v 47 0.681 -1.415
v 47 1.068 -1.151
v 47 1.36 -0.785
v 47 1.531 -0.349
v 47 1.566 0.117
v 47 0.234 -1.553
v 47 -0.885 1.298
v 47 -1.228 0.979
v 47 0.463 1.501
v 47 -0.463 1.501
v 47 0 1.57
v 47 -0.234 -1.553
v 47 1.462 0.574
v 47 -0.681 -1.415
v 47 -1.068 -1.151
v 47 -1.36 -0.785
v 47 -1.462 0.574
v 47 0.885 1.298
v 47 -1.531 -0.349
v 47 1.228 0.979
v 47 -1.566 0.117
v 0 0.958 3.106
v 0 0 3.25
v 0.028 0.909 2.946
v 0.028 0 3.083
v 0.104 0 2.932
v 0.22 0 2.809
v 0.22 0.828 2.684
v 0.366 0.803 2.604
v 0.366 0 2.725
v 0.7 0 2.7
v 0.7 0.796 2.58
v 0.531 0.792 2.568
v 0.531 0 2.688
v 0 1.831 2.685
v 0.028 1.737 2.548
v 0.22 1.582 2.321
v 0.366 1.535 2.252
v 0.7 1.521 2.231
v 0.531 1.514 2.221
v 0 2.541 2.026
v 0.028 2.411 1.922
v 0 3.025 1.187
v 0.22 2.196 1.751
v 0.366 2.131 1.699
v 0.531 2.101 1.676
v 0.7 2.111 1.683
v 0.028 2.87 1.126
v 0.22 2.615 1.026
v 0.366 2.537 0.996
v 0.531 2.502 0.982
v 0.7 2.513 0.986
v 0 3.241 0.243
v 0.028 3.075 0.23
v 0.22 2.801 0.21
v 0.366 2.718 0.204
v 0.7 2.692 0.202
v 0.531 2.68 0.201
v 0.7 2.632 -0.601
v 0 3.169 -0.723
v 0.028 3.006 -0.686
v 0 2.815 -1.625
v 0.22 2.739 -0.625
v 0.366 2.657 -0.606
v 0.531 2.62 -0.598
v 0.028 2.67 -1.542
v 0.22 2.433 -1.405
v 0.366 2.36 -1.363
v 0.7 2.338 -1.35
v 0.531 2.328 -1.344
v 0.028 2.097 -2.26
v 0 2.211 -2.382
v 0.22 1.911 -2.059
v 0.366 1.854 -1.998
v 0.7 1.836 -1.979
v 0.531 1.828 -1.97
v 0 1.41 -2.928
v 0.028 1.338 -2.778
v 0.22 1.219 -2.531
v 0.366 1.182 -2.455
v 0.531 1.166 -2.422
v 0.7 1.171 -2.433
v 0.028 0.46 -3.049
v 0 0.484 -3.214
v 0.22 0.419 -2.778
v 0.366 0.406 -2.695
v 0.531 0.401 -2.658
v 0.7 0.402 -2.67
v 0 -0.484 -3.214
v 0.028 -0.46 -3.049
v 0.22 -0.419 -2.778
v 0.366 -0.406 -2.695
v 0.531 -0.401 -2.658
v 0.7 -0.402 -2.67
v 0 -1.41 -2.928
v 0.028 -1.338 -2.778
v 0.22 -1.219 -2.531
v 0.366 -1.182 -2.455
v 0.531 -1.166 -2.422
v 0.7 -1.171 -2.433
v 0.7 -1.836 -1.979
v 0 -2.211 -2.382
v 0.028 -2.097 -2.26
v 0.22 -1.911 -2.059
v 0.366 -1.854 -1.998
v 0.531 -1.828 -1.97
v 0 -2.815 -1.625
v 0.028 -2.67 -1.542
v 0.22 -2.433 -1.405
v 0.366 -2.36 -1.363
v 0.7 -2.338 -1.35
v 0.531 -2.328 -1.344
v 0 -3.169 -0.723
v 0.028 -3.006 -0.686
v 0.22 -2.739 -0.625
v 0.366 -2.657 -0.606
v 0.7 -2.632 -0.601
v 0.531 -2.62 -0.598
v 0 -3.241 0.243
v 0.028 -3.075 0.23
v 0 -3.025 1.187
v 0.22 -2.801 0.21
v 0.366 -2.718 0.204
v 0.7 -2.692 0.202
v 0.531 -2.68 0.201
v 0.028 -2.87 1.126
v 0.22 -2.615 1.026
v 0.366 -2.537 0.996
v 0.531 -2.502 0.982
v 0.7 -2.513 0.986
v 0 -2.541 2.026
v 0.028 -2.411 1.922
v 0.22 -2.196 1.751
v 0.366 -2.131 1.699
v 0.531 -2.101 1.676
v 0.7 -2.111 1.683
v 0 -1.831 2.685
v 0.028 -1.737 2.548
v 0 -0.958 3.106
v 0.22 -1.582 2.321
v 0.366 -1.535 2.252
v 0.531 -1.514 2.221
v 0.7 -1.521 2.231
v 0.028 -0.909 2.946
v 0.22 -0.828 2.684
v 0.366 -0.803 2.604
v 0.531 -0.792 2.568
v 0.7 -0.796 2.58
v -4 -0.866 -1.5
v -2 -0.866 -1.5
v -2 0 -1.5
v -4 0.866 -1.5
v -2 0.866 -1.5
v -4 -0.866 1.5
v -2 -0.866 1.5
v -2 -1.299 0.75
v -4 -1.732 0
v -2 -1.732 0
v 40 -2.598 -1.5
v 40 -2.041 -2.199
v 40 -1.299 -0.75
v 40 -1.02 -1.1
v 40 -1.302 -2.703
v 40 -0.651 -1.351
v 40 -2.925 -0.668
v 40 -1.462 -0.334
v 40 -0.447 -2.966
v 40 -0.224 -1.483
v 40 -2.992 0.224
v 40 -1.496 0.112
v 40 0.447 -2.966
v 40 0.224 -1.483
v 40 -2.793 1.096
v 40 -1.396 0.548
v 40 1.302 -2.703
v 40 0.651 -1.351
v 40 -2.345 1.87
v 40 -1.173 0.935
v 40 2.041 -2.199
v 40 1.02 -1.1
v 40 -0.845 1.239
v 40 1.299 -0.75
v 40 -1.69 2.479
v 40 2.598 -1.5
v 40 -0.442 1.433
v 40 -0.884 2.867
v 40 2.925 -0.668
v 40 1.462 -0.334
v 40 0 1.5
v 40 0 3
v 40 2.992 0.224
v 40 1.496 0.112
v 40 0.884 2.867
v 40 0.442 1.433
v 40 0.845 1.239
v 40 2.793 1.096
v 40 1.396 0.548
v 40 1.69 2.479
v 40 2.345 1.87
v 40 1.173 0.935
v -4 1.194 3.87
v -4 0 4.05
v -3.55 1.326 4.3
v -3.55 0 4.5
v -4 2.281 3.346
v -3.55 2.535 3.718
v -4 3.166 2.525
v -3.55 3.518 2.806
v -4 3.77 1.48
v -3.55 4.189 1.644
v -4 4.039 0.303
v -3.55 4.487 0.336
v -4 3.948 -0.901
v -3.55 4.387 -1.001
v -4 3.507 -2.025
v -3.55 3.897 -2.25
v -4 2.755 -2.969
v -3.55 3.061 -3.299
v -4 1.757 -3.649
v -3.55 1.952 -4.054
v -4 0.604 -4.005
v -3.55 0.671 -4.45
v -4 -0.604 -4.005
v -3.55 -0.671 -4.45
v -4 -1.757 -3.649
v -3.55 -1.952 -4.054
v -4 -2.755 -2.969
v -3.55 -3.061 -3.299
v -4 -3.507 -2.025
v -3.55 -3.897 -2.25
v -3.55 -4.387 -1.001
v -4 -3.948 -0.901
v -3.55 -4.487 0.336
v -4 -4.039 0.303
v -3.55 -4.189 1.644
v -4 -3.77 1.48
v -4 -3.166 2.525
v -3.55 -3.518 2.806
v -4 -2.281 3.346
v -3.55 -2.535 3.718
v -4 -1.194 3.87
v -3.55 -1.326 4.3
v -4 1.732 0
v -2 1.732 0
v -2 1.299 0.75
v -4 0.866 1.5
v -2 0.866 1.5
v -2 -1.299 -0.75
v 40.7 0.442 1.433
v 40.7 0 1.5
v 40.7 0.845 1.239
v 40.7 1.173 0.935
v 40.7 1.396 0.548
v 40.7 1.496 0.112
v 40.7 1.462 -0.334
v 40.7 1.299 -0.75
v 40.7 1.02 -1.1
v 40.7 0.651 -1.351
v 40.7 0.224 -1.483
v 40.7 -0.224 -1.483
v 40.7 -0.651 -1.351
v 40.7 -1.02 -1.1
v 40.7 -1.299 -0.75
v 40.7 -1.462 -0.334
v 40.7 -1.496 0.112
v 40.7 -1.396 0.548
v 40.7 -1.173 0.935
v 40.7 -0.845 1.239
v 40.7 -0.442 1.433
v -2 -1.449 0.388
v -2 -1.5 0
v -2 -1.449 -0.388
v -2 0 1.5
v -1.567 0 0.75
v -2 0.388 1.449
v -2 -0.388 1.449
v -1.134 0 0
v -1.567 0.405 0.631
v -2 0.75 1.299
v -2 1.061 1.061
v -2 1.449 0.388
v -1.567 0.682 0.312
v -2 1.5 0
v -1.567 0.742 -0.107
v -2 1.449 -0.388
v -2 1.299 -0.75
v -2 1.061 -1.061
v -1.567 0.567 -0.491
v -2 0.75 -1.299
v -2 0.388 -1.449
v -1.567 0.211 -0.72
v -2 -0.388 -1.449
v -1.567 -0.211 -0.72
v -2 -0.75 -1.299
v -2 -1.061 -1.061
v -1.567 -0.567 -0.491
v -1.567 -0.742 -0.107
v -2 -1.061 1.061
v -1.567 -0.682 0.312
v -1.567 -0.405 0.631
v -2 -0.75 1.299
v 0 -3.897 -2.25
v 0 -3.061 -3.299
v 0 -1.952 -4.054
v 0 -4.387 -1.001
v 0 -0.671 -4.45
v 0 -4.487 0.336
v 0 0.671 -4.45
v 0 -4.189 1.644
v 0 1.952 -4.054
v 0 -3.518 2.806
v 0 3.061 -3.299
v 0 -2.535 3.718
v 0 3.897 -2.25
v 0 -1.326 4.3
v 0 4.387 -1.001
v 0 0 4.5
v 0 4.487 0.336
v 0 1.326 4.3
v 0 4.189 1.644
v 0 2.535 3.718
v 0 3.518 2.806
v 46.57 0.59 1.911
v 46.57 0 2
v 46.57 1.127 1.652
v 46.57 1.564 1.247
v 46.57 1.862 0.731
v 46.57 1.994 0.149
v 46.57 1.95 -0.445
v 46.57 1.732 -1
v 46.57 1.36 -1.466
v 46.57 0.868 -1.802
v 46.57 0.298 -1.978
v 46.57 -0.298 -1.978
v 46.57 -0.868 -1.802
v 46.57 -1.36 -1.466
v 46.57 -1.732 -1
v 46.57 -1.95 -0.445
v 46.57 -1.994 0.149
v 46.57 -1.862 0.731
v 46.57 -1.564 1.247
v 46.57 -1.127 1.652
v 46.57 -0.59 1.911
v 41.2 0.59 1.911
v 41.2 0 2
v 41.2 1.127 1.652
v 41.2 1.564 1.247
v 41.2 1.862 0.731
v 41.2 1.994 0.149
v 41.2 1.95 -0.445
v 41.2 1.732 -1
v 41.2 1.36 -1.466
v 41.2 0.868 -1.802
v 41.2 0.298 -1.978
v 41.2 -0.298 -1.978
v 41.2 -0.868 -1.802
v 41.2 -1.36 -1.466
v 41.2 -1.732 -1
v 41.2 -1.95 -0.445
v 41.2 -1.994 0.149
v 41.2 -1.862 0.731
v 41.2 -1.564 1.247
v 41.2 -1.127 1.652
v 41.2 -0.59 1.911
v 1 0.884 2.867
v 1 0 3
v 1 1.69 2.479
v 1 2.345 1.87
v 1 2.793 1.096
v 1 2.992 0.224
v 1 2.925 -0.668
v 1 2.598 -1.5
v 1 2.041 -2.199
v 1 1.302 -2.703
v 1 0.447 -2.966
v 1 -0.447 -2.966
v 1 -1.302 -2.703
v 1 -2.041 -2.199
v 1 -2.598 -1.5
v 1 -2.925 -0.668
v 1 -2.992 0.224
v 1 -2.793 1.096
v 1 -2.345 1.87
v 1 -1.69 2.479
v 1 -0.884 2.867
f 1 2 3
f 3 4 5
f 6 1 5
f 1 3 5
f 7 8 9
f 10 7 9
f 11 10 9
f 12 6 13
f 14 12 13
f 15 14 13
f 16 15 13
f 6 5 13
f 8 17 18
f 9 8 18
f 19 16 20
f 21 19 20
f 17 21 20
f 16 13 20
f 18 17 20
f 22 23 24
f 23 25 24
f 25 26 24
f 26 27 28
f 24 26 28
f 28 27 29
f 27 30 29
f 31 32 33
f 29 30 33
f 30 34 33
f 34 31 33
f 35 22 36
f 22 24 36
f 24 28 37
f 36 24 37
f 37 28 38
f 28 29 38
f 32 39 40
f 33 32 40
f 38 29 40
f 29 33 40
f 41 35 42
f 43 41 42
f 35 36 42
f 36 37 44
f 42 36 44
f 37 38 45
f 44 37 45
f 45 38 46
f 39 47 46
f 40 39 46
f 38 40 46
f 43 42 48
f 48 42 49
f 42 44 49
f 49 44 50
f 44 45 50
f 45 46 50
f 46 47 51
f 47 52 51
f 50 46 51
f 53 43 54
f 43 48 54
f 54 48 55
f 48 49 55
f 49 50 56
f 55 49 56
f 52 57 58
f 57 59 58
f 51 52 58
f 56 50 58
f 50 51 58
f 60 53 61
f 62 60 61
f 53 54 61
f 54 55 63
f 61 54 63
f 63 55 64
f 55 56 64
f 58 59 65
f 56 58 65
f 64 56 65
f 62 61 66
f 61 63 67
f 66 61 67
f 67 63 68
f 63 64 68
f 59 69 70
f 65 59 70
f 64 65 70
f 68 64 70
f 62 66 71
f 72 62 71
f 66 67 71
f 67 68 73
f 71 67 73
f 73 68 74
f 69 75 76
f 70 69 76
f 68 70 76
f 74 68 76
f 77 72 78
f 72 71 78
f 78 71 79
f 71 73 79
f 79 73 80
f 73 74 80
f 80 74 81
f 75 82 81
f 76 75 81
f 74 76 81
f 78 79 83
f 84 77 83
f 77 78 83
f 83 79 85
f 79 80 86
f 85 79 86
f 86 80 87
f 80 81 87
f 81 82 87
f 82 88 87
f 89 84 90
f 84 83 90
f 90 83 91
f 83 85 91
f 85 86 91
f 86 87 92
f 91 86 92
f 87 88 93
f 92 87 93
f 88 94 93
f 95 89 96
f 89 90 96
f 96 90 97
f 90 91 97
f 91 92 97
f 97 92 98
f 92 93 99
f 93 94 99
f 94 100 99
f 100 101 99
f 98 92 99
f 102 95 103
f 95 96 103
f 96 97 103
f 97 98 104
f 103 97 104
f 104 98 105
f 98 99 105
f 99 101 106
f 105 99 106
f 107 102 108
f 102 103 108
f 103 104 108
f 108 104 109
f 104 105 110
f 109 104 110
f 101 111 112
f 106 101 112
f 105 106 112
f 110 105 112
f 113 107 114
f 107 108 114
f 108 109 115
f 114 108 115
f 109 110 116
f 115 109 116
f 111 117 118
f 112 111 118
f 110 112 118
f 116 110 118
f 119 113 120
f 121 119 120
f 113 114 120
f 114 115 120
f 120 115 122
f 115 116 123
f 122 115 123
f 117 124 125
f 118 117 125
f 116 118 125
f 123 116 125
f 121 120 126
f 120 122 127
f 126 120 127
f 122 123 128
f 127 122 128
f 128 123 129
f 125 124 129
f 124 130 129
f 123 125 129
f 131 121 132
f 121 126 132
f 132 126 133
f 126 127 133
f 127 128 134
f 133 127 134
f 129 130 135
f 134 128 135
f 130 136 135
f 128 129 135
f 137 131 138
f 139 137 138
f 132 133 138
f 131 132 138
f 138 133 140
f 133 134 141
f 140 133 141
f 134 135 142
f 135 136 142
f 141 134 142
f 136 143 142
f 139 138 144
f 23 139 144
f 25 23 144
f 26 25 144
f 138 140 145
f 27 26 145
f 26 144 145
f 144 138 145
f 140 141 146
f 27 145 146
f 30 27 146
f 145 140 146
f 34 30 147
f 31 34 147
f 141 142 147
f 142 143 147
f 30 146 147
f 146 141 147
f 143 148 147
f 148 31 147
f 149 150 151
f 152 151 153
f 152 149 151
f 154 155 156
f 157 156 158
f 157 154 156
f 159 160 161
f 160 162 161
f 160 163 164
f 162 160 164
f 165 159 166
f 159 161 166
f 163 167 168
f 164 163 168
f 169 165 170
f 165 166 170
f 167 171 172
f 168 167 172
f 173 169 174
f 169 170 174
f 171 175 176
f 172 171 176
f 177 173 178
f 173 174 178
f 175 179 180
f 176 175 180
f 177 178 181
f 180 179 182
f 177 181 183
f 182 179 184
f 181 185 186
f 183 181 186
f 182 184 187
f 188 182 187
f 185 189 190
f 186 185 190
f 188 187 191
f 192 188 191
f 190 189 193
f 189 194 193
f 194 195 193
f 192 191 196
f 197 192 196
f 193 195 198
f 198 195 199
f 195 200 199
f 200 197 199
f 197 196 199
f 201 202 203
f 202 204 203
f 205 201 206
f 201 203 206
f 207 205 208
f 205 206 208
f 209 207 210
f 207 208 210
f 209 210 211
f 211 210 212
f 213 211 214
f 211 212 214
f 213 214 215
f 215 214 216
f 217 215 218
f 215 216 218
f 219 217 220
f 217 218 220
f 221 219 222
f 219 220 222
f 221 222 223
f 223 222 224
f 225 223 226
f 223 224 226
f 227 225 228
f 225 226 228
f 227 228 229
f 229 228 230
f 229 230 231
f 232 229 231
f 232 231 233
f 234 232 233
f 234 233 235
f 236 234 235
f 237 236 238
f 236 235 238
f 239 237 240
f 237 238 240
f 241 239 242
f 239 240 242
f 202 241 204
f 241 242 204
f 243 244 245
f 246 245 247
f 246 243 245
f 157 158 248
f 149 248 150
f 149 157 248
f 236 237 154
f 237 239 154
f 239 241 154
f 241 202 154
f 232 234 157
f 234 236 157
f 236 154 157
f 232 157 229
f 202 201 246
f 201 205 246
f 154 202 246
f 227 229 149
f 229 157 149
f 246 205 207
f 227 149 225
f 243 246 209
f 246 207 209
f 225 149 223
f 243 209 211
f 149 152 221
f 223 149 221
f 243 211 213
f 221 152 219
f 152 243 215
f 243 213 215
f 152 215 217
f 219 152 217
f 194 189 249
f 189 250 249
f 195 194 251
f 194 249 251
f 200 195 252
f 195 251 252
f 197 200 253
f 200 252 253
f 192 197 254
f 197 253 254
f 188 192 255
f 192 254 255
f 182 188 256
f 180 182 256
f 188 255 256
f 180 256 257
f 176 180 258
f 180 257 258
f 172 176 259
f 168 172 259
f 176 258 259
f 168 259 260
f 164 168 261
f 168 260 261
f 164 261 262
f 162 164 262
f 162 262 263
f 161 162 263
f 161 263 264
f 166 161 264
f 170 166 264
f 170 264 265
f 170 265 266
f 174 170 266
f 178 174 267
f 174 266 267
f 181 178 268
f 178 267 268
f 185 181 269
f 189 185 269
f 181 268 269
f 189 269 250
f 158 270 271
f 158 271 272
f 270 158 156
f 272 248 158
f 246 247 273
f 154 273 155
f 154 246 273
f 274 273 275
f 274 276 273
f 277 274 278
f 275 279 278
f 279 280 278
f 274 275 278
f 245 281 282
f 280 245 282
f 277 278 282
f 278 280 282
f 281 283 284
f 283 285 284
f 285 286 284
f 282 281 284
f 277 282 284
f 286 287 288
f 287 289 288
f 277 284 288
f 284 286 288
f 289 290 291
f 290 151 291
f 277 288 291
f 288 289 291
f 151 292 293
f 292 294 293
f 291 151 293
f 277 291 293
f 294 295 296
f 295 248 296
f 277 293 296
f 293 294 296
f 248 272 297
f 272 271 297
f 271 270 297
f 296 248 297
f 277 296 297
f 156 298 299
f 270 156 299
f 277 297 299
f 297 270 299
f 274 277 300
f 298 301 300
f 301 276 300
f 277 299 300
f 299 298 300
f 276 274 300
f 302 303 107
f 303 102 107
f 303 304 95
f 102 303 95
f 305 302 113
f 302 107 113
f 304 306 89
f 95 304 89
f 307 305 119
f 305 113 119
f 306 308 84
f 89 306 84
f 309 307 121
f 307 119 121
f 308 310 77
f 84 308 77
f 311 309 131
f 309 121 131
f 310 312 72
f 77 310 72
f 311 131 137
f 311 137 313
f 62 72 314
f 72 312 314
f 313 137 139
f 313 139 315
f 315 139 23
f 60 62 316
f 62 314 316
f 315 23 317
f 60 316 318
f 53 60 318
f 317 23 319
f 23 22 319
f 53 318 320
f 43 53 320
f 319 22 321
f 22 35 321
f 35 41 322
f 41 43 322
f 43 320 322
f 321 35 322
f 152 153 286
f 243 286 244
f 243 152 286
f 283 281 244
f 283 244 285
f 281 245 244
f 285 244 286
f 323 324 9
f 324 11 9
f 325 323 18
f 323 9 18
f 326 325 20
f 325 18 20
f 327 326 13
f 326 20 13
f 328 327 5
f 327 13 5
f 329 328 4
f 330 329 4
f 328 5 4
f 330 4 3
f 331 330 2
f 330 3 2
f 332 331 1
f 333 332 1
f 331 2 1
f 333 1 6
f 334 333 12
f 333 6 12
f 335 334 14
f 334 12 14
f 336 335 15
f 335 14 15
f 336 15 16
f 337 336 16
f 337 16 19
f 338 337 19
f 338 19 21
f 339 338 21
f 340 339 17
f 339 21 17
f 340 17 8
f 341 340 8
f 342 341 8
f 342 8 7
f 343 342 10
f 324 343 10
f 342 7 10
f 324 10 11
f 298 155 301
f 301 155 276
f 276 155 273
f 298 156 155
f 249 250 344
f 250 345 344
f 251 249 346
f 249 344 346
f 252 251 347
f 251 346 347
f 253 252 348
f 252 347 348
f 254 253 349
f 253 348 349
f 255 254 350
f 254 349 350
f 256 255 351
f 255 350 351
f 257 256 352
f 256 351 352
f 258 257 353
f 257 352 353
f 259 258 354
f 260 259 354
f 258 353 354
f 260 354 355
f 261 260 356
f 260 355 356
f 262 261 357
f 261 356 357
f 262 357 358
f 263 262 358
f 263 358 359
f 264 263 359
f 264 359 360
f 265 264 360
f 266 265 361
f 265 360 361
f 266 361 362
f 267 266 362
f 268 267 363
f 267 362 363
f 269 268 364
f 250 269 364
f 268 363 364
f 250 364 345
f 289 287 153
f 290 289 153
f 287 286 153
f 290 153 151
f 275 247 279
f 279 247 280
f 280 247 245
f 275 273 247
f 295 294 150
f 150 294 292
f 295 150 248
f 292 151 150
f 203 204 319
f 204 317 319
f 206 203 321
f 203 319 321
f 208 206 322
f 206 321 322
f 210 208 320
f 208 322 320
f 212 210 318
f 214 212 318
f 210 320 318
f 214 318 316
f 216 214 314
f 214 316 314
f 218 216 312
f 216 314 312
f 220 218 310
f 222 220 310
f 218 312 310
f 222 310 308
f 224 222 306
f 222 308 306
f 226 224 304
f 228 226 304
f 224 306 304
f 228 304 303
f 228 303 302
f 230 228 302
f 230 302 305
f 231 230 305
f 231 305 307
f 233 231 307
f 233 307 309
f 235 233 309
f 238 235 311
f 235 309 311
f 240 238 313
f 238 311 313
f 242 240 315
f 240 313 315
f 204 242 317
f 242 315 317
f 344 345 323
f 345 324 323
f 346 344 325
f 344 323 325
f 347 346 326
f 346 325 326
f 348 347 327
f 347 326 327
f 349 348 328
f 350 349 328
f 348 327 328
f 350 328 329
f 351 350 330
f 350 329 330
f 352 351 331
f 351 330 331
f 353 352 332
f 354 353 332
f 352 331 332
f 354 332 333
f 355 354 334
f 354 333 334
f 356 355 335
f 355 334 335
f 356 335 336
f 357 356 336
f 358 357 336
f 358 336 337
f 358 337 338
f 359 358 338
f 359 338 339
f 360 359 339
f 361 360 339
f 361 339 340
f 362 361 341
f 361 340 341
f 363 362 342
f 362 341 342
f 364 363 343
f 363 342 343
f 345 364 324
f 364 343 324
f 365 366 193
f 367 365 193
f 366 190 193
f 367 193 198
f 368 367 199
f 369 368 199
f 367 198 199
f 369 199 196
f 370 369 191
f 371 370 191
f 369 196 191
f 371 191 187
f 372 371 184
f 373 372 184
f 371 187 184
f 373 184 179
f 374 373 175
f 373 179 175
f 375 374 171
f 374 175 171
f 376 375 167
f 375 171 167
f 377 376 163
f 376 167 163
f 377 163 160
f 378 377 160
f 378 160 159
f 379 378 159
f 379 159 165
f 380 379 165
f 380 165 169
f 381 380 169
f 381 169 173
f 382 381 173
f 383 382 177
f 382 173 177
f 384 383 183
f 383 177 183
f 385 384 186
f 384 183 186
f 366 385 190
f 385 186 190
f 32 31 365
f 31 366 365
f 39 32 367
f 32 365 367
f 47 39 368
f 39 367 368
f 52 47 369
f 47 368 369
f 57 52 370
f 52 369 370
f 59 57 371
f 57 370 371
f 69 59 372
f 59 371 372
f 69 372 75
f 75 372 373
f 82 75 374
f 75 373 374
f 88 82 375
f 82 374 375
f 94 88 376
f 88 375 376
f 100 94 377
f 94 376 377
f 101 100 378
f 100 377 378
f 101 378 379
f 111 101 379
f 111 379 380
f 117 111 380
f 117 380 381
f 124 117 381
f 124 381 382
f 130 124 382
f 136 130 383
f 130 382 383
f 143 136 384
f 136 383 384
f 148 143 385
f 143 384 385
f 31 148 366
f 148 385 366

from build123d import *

# Parameters (mm, degrees)
ENL_V_MAT_EXTRU_1_DEPTH = 2


with BuildPart() as part:
    # Esquisse1 → Révolution1 (revolve)
    with BuildSketch(Plane.XY, mode=Mode.PRIVATE) as r_volution1_sk:
        with BuildLine():
            Line((-1.133974596, 0), (-2, 1.5))
            Line((-2, 1.5), (-4, 1.5))
            Line((-4, 1.5), (-4, 4.05))
            Line((-4, 4.05), (-3.55, 4.5))
            Line((-3.55, 4.5), (0, 4.5))
            Line((0, 4.5), (0, 3.25))
            ThreePointArc((0, 3.25), (0.219643047, 2.809091151), (0.7, 2.7))
            Line((0.7, 2.7), (1, 3))
            Line((1, 3), (40, 3))
            Line((40, 3), (40, 1.5))
            Line((40, 1.5), (40.7, 1.5))
            Line((40.7, 1.5), (41.2, 2))
            Line((41.2, 2), (46.5705, 2))
            Line((46.5705, 2), (47, 1.5705))
            Line((47, 1.5705), (47, 0))
            Line((47, 0), (-1.133974596, 0))
        make_face()
    revolve(r_volution1_sk.sketch.rotate(Axis((47, 0, 0), (-1, 0, 0)), 270), axis=Axis((47, 0, 0), (-1, 0, 0)))

    # Esquisse2 → Enlèv. mat.-Extru.1 (cut)
    with BuildSketch(Plane(origin=(-4, 0, 0), x_dir=(0, 0, -1), z_dir=(1, 0, 0))):
        Polygon((-1.5, 0.866025404), (-1.5, -0.866025404), (0, -1.732050808), (1.5, -0.866025404), (1.5, 0.866025404), (0, 1.732050808), align=None)
    extrude(amount=ENL_V_MAT_EXTRU_1_DEPTH, mode=Mode.SUBTRACT)


solid = part.part
